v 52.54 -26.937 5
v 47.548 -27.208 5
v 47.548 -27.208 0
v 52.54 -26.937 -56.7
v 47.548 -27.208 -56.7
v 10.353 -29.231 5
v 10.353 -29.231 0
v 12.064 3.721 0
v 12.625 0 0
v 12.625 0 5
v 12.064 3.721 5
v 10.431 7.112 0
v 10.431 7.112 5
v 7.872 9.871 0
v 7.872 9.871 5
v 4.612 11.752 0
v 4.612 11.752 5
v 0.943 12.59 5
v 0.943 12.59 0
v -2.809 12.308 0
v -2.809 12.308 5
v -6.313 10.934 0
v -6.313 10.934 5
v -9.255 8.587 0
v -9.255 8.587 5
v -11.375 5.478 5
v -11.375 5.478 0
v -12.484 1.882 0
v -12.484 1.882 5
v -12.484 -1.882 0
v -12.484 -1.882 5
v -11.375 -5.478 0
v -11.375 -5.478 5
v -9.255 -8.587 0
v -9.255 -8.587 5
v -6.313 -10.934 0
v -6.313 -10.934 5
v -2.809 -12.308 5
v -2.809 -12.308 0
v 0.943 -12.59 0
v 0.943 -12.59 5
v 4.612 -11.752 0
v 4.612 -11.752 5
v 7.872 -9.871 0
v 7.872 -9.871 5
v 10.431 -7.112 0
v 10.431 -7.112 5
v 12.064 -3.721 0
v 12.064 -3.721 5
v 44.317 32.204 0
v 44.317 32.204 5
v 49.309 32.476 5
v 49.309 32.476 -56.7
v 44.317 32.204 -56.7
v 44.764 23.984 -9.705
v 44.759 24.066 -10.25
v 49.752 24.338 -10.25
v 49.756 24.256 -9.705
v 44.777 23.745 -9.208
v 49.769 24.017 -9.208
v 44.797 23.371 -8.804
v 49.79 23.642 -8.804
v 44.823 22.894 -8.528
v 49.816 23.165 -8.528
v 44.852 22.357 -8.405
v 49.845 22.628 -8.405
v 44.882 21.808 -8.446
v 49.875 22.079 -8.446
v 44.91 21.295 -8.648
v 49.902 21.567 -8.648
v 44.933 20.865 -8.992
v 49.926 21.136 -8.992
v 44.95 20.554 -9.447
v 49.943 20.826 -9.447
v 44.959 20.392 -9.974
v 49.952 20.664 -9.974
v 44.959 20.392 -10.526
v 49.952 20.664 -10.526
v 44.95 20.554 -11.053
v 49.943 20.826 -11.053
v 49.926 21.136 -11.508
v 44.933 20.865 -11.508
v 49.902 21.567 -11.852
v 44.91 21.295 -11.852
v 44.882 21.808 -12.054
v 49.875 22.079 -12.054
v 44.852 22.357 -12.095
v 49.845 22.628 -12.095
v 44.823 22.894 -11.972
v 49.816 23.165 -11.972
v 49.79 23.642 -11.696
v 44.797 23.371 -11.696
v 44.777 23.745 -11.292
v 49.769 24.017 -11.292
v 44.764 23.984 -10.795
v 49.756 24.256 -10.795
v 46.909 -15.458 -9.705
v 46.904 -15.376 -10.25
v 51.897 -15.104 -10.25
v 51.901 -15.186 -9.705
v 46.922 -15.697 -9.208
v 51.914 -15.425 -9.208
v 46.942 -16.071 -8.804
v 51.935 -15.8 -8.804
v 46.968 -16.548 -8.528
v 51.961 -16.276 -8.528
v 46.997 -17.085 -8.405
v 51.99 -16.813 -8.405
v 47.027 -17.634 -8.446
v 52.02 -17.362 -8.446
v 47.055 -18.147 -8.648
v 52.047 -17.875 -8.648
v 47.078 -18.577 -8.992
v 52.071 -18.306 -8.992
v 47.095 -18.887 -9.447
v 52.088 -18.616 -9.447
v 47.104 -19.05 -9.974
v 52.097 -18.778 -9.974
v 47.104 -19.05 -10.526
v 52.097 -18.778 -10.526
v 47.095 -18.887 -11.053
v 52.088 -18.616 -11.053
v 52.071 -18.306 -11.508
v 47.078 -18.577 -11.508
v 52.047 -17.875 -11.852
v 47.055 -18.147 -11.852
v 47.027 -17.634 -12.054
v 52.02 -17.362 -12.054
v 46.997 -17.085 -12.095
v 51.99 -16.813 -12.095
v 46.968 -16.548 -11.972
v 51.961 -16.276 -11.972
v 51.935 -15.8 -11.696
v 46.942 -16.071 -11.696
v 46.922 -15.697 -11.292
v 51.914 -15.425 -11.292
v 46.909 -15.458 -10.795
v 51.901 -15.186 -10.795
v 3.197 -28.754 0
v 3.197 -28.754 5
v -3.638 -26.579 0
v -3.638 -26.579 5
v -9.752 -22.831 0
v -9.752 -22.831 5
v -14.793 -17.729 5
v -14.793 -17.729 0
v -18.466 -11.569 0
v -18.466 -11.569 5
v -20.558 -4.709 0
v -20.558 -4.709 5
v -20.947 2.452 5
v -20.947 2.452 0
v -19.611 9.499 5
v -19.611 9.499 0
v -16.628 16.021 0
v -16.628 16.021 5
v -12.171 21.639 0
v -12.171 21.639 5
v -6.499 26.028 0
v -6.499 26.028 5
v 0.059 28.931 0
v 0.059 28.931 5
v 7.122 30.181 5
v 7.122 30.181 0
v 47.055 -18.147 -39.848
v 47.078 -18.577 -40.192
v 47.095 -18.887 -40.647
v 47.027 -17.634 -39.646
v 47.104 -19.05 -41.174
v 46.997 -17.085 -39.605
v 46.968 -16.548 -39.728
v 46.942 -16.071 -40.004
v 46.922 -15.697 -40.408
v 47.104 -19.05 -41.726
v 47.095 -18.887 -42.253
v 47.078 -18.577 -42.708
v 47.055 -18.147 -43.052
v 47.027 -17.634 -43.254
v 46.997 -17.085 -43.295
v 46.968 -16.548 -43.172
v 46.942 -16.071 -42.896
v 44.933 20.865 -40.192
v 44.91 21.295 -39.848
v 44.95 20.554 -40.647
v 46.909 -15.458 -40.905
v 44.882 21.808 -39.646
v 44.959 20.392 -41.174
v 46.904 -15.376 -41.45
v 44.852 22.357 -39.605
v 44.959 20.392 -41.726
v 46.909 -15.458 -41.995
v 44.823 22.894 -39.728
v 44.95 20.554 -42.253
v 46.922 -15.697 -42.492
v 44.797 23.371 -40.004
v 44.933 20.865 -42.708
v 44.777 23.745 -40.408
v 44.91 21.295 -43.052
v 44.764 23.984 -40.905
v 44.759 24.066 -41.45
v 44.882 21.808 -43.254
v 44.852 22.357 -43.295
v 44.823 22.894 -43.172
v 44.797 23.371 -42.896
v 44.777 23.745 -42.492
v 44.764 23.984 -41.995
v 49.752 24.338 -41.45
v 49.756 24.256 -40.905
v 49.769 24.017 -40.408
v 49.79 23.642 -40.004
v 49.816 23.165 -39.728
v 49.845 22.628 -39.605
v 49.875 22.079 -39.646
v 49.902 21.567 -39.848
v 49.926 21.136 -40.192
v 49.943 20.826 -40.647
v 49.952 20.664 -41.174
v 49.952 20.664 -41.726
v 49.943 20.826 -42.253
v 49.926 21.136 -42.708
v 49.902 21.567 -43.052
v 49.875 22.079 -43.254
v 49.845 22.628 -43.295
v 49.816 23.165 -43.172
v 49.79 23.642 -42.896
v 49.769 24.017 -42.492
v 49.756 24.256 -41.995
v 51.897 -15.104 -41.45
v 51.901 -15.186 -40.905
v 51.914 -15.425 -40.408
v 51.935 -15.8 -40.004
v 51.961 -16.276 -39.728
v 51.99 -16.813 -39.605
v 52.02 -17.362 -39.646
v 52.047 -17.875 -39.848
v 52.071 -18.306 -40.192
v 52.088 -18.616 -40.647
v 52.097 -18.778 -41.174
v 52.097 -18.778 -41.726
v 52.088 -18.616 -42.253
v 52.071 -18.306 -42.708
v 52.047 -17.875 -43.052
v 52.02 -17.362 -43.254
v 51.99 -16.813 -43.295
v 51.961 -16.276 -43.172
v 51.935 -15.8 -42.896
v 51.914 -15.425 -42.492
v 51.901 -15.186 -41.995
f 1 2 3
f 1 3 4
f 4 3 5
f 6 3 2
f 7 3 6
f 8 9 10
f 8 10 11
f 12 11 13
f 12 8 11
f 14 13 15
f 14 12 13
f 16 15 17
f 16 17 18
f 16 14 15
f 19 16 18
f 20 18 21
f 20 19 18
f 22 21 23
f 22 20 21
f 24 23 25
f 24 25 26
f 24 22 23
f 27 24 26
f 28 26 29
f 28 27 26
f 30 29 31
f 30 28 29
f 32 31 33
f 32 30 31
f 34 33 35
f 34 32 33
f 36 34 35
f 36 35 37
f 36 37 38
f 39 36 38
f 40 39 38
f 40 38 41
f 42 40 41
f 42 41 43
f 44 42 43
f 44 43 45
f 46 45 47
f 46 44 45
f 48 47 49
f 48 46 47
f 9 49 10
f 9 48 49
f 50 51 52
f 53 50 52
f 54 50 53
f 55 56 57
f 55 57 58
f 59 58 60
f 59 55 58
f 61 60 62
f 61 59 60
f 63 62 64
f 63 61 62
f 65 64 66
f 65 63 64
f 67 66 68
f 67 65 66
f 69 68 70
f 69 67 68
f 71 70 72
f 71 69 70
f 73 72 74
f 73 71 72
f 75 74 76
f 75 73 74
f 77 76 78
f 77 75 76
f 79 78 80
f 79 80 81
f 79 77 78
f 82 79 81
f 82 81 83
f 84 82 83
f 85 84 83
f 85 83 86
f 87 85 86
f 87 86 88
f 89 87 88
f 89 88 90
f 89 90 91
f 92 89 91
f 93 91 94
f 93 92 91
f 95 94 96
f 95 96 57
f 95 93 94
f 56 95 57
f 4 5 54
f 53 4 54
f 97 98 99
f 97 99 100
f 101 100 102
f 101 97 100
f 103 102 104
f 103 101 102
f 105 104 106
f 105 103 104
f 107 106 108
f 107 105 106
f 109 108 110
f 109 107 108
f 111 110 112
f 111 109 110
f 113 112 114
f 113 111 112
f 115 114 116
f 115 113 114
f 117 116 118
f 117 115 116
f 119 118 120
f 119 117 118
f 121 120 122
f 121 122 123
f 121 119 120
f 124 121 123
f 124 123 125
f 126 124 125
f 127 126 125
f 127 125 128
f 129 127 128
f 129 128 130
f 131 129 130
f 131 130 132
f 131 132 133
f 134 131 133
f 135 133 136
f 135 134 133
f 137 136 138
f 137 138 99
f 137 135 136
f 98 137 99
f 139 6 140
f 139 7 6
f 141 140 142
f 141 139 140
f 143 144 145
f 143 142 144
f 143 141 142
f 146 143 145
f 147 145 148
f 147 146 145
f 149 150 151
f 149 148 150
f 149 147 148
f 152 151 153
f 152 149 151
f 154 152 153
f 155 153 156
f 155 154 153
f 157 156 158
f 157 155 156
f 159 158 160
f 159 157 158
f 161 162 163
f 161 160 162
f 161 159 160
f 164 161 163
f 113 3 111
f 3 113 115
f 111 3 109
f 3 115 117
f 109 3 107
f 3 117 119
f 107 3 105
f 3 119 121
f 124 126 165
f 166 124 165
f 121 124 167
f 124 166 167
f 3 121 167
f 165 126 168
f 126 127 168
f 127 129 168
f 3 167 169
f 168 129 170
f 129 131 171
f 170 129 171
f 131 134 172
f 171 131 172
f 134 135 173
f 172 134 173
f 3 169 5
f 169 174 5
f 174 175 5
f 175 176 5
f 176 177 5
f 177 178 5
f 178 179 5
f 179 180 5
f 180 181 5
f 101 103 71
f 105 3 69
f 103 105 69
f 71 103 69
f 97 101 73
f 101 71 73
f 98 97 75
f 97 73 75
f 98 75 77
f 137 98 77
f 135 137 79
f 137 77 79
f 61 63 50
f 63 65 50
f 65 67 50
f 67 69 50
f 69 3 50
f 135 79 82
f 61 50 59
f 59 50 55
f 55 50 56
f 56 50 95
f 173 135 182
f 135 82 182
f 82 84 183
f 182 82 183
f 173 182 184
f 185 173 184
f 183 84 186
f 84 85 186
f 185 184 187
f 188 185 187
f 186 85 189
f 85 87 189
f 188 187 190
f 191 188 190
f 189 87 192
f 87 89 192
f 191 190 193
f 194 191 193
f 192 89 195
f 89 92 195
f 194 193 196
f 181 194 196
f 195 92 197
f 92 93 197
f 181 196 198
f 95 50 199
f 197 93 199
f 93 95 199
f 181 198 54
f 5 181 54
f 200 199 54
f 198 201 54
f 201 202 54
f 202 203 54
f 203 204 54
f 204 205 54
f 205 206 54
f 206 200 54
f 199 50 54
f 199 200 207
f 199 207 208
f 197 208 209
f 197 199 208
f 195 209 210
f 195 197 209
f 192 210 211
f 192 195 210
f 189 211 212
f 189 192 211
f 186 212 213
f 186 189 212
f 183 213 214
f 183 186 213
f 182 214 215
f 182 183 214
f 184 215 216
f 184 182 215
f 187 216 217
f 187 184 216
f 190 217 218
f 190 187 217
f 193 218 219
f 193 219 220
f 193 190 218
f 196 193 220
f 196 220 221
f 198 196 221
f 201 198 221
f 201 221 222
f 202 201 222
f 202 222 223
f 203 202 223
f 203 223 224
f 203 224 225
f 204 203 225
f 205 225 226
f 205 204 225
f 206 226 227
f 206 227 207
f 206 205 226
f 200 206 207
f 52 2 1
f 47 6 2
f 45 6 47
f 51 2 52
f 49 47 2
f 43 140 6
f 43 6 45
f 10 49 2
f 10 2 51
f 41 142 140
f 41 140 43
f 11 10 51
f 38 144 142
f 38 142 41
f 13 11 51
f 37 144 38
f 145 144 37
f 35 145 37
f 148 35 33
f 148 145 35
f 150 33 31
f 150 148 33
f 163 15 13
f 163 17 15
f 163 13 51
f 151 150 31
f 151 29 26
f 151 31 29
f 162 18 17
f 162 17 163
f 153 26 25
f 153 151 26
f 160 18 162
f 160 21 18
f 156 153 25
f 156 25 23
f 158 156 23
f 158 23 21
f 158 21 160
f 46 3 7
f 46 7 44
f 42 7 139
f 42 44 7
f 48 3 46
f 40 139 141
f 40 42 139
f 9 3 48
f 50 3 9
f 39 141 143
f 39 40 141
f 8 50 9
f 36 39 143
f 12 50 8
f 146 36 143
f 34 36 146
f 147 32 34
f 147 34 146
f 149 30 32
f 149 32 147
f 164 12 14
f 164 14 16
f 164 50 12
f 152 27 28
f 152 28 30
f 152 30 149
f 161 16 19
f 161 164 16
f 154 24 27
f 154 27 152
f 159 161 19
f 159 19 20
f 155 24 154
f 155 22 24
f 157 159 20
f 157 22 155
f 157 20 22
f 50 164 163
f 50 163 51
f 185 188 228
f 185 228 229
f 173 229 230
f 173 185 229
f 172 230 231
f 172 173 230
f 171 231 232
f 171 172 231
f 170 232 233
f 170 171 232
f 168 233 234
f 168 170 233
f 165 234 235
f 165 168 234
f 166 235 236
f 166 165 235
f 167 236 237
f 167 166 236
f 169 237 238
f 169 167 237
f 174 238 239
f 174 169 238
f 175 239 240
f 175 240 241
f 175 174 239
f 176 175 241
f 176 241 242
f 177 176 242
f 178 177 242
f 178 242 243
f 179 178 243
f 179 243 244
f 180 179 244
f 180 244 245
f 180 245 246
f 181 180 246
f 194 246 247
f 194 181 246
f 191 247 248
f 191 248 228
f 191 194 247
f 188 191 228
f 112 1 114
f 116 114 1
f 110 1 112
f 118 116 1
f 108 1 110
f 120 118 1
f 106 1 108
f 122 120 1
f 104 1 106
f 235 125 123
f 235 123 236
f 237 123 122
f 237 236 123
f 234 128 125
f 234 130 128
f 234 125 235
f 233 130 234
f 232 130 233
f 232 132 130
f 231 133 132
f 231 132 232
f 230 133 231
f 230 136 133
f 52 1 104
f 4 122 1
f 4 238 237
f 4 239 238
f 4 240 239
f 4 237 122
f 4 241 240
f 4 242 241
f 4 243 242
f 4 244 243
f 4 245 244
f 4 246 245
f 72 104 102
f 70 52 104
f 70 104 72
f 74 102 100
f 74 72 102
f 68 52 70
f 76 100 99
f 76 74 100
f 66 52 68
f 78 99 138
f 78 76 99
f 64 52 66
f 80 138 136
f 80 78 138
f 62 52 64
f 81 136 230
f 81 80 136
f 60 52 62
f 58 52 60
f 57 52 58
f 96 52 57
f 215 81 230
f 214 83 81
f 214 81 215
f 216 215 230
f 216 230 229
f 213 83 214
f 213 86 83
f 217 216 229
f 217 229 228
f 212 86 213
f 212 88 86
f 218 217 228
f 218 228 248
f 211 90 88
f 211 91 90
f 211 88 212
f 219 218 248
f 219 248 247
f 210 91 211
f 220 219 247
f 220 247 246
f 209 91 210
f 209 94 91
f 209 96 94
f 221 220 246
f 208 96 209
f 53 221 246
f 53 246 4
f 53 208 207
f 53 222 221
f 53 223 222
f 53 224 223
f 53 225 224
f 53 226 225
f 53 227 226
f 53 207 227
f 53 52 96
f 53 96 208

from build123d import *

# Parameters (mm, degrees)
SKETCH1_R           = 12.625
BOSS_EXTRUDE1_DEPTH = 5
SKETCH2_W           = 61.7
SKETCH2_H           = 59.5
SKETCH2_R           = 1.85
BOSS_EXTRUDE2_DEPTH = 5
FILLET1_RADIUS      = 29.75
FILLET1_LENGTH      = 5


with BuildPart() as part:
    # Sketch1 → Boss-Extrude1 (new body)
    with BuildSketch(Plane.XY):
        Polygon((-22.584548564, 28.565725374), (44.316590659, 32.204072605), (47.547660215, -27.208133124), (-19.353479009, -30.846480354), align=None)
        Circle(SKETCH1_R, mode=Mode.SUBTRACT)
    extrude(amount=BOSS_EXTRUDE1_DEPTH)

    # Sketch2 → Boss-Extrude2 (add)
    with BuildSketch(Plane(origin=(45.932125437, 2.49796974, 0), x_dir=(0, 0, -1), z_dir=(0.9985244660253657, 0.05430369001051772, 0))):
        with Locations((25.85, 0)):
            Rectangle(SKETCH2_W, SKETCH2_H)
        with Locations(Location((10.25, 19.75, 0), (0, 0, 90))):
            Circle(SKETCH2_R, mode=Mode.SUBTRACT)
        with Locations(Location((41.45, 19.75, 0), (0, 0, 90))):
            Circle(SKETCH2_R, mode=Mode.SUBTRACT)
        with Locations(Location((41.45, -19.75, 0), (0, 0, 90))):
            Circle(SKETCH2_R, mode=Mode.SUBTRACT)
        with Locations(Location((10.25, -19.75, 0), (0, 0, 90))):
            Circle(SKETCH2_R, mode=Mode.SUBTRACT)
    extrude(amount=BOSS_EXTRUDE2_DEPTH)

    # Fillet1: full round fillet: the end face becomes a half cylinder, R = half its width
    fillet1_face = Plane((-20.969013787, -1.14037749, 2.5), x_dir=(0, 0, -1), z_dir=(-0.998524466025, -0.054303690011, 0))  # on the end face: x along it, z out of the body
    fillet1_slab = fillet1_face.offset(-FILLET1_RADIUS / 2) * Box(FILLET1_LENGTH, 2 * FILLET1_RADIUS, FILLET1_RADIUS, mode=Mode.PRIVATE)  # the body's end, R deep
    fillet1_round = Plane((8.737089077, 0.475157288, 2.5), x_dir=(-0.998524466025, -0.054303690011, 0), z_dir=(0, 0, -1)) * Cylinder(FILLET1_RADIUS, FILLET1_LENGTH, mode=Mode.PRIVATE)  # its axis R under the face
    add(fillet1_slab - fillet1_round, mode=Mode.SUBTRACT)


solid = part.part
